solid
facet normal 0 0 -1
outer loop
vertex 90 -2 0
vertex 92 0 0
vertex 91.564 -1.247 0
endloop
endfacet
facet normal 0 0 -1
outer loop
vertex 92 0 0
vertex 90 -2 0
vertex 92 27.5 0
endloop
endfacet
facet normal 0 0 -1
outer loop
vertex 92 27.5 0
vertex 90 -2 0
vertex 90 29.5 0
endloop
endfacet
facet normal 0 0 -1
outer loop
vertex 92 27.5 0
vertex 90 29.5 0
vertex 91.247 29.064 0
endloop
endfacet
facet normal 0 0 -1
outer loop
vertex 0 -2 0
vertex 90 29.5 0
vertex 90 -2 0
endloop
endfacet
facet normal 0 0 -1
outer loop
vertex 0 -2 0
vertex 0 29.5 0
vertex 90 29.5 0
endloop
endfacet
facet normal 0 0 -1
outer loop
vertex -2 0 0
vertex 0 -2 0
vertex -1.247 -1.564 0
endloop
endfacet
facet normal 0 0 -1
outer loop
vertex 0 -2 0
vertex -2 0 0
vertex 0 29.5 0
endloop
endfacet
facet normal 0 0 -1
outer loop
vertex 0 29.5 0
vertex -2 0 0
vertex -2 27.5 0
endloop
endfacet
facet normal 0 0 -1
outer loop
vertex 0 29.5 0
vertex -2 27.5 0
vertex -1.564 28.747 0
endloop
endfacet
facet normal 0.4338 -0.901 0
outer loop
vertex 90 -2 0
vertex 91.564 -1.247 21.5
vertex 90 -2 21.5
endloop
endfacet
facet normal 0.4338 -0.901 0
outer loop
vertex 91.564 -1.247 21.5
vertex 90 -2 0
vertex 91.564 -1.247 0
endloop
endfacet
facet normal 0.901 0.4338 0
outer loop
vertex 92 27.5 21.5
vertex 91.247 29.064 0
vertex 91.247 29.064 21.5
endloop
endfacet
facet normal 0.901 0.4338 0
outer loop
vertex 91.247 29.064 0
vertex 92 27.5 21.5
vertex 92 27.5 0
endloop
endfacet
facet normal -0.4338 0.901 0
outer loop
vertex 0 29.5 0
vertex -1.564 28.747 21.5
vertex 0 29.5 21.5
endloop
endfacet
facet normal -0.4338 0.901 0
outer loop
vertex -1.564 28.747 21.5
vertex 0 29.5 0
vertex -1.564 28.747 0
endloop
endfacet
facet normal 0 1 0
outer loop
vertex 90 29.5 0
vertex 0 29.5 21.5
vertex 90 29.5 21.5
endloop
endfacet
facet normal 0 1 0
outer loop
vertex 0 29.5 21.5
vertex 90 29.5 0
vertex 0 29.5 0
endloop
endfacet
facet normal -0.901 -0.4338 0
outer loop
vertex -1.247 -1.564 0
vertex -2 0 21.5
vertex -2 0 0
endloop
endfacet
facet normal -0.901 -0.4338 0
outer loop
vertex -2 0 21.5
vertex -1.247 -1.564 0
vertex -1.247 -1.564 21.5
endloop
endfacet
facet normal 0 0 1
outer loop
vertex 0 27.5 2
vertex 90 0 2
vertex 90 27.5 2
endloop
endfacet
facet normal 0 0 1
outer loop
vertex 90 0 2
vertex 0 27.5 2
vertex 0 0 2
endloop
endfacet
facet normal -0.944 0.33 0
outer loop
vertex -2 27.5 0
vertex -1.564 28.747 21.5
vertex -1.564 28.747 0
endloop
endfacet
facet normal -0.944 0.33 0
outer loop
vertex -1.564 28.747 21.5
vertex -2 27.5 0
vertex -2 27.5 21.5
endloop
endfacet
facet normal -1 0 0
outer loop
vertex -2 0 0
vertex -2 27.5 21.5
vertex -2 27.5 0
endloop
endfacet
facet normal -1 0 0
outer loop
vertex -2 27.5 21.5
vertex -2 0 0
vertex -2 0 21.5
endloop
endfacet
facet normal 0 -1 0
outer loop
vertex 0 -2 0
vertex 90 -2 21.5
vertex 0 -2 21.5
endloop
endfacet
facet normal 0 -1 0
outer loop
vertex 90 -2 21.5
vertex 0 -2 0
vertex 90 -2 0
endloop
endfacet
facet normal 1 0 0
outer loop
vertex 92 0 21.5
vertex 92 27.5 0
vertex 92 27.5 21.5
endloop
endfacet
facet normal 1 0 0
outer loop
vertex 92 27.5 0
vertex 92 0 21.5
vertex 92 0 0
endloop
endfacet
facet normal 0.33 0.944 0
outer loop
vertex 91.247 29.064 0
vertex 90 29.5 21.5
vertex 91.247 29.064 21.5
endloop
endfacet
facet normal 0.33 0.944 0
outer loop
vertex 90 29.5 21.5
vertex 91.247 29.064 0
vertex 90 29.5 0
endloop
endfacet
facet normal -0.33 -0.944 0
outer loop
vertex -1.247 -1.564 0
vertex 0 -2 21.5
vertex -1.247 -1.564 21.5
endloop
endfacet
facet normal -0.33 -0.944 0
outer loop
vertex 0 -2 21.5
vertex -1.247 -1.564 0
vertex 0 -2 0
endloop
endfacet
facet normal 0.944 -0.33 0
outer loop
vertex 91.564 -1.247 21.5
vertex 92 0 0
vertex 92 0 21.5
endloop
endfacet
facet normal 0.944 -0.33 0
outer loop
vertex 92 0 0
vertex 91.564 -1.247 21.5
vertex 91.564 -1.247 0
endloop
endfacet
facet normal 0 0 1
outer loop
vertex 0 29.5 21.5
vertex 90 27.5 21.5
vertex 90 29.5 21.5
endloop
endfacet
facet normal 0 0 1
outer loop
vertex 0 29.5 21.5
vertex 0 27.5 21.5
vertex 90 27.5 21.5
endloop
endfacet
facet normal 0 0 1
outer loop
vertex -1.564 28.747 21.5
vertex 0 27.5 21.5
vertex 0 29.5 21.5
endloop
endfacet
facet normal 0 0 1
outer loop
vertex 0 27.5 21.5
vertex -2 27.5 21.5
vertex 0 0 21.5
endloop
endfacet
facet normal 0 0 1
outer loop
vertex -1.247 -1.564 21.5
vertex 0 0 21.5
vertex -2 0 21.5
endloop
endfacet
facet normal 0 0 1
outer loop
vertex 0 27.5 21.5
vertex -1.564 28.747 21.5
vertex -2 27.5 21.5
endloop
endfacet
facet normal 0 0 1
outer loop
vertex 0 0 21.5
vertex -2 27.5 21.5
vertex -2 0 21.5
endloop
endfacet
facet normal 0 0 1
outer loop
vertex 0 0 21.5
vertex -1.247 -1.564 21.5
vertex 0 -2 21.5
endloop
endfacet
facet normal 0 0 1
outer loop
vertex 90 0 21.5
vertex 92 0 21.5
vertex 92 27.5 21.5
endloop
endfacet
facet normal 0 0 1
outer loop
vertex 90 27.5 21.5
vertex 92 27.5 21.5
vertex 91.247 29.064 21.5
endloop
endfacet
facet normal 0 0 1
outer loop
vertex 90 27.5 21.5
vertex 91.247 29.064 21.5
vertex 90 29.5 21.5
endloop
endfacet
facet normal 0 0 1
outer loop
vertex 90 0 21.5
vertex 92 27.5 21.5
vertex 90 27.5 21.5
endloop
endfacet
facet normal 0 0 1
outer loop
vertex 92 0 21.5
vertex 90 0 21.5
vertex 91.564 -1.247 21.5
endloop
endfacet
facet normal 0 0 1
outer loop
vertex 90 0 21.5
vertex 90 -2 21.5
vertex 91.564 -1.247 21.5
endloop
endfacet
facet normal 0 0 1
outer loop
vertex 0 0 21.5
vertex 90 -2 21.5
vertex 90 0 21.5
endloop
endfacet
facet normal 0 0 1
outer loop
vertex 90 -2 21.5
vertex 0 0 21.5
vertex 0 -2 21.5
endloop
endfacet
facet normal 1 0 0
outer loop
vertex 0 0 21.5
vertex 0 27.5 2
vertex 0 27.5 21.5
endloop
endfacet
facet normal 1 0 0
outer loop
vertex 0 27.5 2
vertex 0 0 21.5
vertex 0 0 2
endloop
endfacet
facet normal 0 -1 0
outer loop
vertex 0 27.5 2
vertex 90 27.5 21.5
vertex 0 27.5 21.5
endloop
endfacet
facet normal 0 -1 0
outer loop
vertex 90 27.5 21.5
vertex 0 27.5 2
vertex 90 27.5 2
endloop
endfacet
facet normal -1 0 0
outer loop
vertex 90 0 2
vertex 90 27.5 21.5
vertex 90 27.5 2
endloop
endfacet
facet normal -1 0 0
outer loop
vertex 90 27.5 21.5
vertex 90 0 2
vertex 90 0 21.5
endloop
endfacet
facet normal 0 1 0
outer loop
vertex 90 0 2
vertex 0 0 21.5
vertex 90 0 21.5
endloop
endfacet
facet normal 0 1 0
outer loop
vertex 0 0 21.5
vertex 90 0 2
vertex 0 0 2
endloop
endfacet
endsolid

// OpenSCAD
linear_extrude(2) offset(2) square([90, 27.5]);
translate([0,0,2])
linear_extrude(17.5 + 2) {
	difference() {
		offset(2) square([90, 27.5]);
		square([90, 27.5]);
	}
}
